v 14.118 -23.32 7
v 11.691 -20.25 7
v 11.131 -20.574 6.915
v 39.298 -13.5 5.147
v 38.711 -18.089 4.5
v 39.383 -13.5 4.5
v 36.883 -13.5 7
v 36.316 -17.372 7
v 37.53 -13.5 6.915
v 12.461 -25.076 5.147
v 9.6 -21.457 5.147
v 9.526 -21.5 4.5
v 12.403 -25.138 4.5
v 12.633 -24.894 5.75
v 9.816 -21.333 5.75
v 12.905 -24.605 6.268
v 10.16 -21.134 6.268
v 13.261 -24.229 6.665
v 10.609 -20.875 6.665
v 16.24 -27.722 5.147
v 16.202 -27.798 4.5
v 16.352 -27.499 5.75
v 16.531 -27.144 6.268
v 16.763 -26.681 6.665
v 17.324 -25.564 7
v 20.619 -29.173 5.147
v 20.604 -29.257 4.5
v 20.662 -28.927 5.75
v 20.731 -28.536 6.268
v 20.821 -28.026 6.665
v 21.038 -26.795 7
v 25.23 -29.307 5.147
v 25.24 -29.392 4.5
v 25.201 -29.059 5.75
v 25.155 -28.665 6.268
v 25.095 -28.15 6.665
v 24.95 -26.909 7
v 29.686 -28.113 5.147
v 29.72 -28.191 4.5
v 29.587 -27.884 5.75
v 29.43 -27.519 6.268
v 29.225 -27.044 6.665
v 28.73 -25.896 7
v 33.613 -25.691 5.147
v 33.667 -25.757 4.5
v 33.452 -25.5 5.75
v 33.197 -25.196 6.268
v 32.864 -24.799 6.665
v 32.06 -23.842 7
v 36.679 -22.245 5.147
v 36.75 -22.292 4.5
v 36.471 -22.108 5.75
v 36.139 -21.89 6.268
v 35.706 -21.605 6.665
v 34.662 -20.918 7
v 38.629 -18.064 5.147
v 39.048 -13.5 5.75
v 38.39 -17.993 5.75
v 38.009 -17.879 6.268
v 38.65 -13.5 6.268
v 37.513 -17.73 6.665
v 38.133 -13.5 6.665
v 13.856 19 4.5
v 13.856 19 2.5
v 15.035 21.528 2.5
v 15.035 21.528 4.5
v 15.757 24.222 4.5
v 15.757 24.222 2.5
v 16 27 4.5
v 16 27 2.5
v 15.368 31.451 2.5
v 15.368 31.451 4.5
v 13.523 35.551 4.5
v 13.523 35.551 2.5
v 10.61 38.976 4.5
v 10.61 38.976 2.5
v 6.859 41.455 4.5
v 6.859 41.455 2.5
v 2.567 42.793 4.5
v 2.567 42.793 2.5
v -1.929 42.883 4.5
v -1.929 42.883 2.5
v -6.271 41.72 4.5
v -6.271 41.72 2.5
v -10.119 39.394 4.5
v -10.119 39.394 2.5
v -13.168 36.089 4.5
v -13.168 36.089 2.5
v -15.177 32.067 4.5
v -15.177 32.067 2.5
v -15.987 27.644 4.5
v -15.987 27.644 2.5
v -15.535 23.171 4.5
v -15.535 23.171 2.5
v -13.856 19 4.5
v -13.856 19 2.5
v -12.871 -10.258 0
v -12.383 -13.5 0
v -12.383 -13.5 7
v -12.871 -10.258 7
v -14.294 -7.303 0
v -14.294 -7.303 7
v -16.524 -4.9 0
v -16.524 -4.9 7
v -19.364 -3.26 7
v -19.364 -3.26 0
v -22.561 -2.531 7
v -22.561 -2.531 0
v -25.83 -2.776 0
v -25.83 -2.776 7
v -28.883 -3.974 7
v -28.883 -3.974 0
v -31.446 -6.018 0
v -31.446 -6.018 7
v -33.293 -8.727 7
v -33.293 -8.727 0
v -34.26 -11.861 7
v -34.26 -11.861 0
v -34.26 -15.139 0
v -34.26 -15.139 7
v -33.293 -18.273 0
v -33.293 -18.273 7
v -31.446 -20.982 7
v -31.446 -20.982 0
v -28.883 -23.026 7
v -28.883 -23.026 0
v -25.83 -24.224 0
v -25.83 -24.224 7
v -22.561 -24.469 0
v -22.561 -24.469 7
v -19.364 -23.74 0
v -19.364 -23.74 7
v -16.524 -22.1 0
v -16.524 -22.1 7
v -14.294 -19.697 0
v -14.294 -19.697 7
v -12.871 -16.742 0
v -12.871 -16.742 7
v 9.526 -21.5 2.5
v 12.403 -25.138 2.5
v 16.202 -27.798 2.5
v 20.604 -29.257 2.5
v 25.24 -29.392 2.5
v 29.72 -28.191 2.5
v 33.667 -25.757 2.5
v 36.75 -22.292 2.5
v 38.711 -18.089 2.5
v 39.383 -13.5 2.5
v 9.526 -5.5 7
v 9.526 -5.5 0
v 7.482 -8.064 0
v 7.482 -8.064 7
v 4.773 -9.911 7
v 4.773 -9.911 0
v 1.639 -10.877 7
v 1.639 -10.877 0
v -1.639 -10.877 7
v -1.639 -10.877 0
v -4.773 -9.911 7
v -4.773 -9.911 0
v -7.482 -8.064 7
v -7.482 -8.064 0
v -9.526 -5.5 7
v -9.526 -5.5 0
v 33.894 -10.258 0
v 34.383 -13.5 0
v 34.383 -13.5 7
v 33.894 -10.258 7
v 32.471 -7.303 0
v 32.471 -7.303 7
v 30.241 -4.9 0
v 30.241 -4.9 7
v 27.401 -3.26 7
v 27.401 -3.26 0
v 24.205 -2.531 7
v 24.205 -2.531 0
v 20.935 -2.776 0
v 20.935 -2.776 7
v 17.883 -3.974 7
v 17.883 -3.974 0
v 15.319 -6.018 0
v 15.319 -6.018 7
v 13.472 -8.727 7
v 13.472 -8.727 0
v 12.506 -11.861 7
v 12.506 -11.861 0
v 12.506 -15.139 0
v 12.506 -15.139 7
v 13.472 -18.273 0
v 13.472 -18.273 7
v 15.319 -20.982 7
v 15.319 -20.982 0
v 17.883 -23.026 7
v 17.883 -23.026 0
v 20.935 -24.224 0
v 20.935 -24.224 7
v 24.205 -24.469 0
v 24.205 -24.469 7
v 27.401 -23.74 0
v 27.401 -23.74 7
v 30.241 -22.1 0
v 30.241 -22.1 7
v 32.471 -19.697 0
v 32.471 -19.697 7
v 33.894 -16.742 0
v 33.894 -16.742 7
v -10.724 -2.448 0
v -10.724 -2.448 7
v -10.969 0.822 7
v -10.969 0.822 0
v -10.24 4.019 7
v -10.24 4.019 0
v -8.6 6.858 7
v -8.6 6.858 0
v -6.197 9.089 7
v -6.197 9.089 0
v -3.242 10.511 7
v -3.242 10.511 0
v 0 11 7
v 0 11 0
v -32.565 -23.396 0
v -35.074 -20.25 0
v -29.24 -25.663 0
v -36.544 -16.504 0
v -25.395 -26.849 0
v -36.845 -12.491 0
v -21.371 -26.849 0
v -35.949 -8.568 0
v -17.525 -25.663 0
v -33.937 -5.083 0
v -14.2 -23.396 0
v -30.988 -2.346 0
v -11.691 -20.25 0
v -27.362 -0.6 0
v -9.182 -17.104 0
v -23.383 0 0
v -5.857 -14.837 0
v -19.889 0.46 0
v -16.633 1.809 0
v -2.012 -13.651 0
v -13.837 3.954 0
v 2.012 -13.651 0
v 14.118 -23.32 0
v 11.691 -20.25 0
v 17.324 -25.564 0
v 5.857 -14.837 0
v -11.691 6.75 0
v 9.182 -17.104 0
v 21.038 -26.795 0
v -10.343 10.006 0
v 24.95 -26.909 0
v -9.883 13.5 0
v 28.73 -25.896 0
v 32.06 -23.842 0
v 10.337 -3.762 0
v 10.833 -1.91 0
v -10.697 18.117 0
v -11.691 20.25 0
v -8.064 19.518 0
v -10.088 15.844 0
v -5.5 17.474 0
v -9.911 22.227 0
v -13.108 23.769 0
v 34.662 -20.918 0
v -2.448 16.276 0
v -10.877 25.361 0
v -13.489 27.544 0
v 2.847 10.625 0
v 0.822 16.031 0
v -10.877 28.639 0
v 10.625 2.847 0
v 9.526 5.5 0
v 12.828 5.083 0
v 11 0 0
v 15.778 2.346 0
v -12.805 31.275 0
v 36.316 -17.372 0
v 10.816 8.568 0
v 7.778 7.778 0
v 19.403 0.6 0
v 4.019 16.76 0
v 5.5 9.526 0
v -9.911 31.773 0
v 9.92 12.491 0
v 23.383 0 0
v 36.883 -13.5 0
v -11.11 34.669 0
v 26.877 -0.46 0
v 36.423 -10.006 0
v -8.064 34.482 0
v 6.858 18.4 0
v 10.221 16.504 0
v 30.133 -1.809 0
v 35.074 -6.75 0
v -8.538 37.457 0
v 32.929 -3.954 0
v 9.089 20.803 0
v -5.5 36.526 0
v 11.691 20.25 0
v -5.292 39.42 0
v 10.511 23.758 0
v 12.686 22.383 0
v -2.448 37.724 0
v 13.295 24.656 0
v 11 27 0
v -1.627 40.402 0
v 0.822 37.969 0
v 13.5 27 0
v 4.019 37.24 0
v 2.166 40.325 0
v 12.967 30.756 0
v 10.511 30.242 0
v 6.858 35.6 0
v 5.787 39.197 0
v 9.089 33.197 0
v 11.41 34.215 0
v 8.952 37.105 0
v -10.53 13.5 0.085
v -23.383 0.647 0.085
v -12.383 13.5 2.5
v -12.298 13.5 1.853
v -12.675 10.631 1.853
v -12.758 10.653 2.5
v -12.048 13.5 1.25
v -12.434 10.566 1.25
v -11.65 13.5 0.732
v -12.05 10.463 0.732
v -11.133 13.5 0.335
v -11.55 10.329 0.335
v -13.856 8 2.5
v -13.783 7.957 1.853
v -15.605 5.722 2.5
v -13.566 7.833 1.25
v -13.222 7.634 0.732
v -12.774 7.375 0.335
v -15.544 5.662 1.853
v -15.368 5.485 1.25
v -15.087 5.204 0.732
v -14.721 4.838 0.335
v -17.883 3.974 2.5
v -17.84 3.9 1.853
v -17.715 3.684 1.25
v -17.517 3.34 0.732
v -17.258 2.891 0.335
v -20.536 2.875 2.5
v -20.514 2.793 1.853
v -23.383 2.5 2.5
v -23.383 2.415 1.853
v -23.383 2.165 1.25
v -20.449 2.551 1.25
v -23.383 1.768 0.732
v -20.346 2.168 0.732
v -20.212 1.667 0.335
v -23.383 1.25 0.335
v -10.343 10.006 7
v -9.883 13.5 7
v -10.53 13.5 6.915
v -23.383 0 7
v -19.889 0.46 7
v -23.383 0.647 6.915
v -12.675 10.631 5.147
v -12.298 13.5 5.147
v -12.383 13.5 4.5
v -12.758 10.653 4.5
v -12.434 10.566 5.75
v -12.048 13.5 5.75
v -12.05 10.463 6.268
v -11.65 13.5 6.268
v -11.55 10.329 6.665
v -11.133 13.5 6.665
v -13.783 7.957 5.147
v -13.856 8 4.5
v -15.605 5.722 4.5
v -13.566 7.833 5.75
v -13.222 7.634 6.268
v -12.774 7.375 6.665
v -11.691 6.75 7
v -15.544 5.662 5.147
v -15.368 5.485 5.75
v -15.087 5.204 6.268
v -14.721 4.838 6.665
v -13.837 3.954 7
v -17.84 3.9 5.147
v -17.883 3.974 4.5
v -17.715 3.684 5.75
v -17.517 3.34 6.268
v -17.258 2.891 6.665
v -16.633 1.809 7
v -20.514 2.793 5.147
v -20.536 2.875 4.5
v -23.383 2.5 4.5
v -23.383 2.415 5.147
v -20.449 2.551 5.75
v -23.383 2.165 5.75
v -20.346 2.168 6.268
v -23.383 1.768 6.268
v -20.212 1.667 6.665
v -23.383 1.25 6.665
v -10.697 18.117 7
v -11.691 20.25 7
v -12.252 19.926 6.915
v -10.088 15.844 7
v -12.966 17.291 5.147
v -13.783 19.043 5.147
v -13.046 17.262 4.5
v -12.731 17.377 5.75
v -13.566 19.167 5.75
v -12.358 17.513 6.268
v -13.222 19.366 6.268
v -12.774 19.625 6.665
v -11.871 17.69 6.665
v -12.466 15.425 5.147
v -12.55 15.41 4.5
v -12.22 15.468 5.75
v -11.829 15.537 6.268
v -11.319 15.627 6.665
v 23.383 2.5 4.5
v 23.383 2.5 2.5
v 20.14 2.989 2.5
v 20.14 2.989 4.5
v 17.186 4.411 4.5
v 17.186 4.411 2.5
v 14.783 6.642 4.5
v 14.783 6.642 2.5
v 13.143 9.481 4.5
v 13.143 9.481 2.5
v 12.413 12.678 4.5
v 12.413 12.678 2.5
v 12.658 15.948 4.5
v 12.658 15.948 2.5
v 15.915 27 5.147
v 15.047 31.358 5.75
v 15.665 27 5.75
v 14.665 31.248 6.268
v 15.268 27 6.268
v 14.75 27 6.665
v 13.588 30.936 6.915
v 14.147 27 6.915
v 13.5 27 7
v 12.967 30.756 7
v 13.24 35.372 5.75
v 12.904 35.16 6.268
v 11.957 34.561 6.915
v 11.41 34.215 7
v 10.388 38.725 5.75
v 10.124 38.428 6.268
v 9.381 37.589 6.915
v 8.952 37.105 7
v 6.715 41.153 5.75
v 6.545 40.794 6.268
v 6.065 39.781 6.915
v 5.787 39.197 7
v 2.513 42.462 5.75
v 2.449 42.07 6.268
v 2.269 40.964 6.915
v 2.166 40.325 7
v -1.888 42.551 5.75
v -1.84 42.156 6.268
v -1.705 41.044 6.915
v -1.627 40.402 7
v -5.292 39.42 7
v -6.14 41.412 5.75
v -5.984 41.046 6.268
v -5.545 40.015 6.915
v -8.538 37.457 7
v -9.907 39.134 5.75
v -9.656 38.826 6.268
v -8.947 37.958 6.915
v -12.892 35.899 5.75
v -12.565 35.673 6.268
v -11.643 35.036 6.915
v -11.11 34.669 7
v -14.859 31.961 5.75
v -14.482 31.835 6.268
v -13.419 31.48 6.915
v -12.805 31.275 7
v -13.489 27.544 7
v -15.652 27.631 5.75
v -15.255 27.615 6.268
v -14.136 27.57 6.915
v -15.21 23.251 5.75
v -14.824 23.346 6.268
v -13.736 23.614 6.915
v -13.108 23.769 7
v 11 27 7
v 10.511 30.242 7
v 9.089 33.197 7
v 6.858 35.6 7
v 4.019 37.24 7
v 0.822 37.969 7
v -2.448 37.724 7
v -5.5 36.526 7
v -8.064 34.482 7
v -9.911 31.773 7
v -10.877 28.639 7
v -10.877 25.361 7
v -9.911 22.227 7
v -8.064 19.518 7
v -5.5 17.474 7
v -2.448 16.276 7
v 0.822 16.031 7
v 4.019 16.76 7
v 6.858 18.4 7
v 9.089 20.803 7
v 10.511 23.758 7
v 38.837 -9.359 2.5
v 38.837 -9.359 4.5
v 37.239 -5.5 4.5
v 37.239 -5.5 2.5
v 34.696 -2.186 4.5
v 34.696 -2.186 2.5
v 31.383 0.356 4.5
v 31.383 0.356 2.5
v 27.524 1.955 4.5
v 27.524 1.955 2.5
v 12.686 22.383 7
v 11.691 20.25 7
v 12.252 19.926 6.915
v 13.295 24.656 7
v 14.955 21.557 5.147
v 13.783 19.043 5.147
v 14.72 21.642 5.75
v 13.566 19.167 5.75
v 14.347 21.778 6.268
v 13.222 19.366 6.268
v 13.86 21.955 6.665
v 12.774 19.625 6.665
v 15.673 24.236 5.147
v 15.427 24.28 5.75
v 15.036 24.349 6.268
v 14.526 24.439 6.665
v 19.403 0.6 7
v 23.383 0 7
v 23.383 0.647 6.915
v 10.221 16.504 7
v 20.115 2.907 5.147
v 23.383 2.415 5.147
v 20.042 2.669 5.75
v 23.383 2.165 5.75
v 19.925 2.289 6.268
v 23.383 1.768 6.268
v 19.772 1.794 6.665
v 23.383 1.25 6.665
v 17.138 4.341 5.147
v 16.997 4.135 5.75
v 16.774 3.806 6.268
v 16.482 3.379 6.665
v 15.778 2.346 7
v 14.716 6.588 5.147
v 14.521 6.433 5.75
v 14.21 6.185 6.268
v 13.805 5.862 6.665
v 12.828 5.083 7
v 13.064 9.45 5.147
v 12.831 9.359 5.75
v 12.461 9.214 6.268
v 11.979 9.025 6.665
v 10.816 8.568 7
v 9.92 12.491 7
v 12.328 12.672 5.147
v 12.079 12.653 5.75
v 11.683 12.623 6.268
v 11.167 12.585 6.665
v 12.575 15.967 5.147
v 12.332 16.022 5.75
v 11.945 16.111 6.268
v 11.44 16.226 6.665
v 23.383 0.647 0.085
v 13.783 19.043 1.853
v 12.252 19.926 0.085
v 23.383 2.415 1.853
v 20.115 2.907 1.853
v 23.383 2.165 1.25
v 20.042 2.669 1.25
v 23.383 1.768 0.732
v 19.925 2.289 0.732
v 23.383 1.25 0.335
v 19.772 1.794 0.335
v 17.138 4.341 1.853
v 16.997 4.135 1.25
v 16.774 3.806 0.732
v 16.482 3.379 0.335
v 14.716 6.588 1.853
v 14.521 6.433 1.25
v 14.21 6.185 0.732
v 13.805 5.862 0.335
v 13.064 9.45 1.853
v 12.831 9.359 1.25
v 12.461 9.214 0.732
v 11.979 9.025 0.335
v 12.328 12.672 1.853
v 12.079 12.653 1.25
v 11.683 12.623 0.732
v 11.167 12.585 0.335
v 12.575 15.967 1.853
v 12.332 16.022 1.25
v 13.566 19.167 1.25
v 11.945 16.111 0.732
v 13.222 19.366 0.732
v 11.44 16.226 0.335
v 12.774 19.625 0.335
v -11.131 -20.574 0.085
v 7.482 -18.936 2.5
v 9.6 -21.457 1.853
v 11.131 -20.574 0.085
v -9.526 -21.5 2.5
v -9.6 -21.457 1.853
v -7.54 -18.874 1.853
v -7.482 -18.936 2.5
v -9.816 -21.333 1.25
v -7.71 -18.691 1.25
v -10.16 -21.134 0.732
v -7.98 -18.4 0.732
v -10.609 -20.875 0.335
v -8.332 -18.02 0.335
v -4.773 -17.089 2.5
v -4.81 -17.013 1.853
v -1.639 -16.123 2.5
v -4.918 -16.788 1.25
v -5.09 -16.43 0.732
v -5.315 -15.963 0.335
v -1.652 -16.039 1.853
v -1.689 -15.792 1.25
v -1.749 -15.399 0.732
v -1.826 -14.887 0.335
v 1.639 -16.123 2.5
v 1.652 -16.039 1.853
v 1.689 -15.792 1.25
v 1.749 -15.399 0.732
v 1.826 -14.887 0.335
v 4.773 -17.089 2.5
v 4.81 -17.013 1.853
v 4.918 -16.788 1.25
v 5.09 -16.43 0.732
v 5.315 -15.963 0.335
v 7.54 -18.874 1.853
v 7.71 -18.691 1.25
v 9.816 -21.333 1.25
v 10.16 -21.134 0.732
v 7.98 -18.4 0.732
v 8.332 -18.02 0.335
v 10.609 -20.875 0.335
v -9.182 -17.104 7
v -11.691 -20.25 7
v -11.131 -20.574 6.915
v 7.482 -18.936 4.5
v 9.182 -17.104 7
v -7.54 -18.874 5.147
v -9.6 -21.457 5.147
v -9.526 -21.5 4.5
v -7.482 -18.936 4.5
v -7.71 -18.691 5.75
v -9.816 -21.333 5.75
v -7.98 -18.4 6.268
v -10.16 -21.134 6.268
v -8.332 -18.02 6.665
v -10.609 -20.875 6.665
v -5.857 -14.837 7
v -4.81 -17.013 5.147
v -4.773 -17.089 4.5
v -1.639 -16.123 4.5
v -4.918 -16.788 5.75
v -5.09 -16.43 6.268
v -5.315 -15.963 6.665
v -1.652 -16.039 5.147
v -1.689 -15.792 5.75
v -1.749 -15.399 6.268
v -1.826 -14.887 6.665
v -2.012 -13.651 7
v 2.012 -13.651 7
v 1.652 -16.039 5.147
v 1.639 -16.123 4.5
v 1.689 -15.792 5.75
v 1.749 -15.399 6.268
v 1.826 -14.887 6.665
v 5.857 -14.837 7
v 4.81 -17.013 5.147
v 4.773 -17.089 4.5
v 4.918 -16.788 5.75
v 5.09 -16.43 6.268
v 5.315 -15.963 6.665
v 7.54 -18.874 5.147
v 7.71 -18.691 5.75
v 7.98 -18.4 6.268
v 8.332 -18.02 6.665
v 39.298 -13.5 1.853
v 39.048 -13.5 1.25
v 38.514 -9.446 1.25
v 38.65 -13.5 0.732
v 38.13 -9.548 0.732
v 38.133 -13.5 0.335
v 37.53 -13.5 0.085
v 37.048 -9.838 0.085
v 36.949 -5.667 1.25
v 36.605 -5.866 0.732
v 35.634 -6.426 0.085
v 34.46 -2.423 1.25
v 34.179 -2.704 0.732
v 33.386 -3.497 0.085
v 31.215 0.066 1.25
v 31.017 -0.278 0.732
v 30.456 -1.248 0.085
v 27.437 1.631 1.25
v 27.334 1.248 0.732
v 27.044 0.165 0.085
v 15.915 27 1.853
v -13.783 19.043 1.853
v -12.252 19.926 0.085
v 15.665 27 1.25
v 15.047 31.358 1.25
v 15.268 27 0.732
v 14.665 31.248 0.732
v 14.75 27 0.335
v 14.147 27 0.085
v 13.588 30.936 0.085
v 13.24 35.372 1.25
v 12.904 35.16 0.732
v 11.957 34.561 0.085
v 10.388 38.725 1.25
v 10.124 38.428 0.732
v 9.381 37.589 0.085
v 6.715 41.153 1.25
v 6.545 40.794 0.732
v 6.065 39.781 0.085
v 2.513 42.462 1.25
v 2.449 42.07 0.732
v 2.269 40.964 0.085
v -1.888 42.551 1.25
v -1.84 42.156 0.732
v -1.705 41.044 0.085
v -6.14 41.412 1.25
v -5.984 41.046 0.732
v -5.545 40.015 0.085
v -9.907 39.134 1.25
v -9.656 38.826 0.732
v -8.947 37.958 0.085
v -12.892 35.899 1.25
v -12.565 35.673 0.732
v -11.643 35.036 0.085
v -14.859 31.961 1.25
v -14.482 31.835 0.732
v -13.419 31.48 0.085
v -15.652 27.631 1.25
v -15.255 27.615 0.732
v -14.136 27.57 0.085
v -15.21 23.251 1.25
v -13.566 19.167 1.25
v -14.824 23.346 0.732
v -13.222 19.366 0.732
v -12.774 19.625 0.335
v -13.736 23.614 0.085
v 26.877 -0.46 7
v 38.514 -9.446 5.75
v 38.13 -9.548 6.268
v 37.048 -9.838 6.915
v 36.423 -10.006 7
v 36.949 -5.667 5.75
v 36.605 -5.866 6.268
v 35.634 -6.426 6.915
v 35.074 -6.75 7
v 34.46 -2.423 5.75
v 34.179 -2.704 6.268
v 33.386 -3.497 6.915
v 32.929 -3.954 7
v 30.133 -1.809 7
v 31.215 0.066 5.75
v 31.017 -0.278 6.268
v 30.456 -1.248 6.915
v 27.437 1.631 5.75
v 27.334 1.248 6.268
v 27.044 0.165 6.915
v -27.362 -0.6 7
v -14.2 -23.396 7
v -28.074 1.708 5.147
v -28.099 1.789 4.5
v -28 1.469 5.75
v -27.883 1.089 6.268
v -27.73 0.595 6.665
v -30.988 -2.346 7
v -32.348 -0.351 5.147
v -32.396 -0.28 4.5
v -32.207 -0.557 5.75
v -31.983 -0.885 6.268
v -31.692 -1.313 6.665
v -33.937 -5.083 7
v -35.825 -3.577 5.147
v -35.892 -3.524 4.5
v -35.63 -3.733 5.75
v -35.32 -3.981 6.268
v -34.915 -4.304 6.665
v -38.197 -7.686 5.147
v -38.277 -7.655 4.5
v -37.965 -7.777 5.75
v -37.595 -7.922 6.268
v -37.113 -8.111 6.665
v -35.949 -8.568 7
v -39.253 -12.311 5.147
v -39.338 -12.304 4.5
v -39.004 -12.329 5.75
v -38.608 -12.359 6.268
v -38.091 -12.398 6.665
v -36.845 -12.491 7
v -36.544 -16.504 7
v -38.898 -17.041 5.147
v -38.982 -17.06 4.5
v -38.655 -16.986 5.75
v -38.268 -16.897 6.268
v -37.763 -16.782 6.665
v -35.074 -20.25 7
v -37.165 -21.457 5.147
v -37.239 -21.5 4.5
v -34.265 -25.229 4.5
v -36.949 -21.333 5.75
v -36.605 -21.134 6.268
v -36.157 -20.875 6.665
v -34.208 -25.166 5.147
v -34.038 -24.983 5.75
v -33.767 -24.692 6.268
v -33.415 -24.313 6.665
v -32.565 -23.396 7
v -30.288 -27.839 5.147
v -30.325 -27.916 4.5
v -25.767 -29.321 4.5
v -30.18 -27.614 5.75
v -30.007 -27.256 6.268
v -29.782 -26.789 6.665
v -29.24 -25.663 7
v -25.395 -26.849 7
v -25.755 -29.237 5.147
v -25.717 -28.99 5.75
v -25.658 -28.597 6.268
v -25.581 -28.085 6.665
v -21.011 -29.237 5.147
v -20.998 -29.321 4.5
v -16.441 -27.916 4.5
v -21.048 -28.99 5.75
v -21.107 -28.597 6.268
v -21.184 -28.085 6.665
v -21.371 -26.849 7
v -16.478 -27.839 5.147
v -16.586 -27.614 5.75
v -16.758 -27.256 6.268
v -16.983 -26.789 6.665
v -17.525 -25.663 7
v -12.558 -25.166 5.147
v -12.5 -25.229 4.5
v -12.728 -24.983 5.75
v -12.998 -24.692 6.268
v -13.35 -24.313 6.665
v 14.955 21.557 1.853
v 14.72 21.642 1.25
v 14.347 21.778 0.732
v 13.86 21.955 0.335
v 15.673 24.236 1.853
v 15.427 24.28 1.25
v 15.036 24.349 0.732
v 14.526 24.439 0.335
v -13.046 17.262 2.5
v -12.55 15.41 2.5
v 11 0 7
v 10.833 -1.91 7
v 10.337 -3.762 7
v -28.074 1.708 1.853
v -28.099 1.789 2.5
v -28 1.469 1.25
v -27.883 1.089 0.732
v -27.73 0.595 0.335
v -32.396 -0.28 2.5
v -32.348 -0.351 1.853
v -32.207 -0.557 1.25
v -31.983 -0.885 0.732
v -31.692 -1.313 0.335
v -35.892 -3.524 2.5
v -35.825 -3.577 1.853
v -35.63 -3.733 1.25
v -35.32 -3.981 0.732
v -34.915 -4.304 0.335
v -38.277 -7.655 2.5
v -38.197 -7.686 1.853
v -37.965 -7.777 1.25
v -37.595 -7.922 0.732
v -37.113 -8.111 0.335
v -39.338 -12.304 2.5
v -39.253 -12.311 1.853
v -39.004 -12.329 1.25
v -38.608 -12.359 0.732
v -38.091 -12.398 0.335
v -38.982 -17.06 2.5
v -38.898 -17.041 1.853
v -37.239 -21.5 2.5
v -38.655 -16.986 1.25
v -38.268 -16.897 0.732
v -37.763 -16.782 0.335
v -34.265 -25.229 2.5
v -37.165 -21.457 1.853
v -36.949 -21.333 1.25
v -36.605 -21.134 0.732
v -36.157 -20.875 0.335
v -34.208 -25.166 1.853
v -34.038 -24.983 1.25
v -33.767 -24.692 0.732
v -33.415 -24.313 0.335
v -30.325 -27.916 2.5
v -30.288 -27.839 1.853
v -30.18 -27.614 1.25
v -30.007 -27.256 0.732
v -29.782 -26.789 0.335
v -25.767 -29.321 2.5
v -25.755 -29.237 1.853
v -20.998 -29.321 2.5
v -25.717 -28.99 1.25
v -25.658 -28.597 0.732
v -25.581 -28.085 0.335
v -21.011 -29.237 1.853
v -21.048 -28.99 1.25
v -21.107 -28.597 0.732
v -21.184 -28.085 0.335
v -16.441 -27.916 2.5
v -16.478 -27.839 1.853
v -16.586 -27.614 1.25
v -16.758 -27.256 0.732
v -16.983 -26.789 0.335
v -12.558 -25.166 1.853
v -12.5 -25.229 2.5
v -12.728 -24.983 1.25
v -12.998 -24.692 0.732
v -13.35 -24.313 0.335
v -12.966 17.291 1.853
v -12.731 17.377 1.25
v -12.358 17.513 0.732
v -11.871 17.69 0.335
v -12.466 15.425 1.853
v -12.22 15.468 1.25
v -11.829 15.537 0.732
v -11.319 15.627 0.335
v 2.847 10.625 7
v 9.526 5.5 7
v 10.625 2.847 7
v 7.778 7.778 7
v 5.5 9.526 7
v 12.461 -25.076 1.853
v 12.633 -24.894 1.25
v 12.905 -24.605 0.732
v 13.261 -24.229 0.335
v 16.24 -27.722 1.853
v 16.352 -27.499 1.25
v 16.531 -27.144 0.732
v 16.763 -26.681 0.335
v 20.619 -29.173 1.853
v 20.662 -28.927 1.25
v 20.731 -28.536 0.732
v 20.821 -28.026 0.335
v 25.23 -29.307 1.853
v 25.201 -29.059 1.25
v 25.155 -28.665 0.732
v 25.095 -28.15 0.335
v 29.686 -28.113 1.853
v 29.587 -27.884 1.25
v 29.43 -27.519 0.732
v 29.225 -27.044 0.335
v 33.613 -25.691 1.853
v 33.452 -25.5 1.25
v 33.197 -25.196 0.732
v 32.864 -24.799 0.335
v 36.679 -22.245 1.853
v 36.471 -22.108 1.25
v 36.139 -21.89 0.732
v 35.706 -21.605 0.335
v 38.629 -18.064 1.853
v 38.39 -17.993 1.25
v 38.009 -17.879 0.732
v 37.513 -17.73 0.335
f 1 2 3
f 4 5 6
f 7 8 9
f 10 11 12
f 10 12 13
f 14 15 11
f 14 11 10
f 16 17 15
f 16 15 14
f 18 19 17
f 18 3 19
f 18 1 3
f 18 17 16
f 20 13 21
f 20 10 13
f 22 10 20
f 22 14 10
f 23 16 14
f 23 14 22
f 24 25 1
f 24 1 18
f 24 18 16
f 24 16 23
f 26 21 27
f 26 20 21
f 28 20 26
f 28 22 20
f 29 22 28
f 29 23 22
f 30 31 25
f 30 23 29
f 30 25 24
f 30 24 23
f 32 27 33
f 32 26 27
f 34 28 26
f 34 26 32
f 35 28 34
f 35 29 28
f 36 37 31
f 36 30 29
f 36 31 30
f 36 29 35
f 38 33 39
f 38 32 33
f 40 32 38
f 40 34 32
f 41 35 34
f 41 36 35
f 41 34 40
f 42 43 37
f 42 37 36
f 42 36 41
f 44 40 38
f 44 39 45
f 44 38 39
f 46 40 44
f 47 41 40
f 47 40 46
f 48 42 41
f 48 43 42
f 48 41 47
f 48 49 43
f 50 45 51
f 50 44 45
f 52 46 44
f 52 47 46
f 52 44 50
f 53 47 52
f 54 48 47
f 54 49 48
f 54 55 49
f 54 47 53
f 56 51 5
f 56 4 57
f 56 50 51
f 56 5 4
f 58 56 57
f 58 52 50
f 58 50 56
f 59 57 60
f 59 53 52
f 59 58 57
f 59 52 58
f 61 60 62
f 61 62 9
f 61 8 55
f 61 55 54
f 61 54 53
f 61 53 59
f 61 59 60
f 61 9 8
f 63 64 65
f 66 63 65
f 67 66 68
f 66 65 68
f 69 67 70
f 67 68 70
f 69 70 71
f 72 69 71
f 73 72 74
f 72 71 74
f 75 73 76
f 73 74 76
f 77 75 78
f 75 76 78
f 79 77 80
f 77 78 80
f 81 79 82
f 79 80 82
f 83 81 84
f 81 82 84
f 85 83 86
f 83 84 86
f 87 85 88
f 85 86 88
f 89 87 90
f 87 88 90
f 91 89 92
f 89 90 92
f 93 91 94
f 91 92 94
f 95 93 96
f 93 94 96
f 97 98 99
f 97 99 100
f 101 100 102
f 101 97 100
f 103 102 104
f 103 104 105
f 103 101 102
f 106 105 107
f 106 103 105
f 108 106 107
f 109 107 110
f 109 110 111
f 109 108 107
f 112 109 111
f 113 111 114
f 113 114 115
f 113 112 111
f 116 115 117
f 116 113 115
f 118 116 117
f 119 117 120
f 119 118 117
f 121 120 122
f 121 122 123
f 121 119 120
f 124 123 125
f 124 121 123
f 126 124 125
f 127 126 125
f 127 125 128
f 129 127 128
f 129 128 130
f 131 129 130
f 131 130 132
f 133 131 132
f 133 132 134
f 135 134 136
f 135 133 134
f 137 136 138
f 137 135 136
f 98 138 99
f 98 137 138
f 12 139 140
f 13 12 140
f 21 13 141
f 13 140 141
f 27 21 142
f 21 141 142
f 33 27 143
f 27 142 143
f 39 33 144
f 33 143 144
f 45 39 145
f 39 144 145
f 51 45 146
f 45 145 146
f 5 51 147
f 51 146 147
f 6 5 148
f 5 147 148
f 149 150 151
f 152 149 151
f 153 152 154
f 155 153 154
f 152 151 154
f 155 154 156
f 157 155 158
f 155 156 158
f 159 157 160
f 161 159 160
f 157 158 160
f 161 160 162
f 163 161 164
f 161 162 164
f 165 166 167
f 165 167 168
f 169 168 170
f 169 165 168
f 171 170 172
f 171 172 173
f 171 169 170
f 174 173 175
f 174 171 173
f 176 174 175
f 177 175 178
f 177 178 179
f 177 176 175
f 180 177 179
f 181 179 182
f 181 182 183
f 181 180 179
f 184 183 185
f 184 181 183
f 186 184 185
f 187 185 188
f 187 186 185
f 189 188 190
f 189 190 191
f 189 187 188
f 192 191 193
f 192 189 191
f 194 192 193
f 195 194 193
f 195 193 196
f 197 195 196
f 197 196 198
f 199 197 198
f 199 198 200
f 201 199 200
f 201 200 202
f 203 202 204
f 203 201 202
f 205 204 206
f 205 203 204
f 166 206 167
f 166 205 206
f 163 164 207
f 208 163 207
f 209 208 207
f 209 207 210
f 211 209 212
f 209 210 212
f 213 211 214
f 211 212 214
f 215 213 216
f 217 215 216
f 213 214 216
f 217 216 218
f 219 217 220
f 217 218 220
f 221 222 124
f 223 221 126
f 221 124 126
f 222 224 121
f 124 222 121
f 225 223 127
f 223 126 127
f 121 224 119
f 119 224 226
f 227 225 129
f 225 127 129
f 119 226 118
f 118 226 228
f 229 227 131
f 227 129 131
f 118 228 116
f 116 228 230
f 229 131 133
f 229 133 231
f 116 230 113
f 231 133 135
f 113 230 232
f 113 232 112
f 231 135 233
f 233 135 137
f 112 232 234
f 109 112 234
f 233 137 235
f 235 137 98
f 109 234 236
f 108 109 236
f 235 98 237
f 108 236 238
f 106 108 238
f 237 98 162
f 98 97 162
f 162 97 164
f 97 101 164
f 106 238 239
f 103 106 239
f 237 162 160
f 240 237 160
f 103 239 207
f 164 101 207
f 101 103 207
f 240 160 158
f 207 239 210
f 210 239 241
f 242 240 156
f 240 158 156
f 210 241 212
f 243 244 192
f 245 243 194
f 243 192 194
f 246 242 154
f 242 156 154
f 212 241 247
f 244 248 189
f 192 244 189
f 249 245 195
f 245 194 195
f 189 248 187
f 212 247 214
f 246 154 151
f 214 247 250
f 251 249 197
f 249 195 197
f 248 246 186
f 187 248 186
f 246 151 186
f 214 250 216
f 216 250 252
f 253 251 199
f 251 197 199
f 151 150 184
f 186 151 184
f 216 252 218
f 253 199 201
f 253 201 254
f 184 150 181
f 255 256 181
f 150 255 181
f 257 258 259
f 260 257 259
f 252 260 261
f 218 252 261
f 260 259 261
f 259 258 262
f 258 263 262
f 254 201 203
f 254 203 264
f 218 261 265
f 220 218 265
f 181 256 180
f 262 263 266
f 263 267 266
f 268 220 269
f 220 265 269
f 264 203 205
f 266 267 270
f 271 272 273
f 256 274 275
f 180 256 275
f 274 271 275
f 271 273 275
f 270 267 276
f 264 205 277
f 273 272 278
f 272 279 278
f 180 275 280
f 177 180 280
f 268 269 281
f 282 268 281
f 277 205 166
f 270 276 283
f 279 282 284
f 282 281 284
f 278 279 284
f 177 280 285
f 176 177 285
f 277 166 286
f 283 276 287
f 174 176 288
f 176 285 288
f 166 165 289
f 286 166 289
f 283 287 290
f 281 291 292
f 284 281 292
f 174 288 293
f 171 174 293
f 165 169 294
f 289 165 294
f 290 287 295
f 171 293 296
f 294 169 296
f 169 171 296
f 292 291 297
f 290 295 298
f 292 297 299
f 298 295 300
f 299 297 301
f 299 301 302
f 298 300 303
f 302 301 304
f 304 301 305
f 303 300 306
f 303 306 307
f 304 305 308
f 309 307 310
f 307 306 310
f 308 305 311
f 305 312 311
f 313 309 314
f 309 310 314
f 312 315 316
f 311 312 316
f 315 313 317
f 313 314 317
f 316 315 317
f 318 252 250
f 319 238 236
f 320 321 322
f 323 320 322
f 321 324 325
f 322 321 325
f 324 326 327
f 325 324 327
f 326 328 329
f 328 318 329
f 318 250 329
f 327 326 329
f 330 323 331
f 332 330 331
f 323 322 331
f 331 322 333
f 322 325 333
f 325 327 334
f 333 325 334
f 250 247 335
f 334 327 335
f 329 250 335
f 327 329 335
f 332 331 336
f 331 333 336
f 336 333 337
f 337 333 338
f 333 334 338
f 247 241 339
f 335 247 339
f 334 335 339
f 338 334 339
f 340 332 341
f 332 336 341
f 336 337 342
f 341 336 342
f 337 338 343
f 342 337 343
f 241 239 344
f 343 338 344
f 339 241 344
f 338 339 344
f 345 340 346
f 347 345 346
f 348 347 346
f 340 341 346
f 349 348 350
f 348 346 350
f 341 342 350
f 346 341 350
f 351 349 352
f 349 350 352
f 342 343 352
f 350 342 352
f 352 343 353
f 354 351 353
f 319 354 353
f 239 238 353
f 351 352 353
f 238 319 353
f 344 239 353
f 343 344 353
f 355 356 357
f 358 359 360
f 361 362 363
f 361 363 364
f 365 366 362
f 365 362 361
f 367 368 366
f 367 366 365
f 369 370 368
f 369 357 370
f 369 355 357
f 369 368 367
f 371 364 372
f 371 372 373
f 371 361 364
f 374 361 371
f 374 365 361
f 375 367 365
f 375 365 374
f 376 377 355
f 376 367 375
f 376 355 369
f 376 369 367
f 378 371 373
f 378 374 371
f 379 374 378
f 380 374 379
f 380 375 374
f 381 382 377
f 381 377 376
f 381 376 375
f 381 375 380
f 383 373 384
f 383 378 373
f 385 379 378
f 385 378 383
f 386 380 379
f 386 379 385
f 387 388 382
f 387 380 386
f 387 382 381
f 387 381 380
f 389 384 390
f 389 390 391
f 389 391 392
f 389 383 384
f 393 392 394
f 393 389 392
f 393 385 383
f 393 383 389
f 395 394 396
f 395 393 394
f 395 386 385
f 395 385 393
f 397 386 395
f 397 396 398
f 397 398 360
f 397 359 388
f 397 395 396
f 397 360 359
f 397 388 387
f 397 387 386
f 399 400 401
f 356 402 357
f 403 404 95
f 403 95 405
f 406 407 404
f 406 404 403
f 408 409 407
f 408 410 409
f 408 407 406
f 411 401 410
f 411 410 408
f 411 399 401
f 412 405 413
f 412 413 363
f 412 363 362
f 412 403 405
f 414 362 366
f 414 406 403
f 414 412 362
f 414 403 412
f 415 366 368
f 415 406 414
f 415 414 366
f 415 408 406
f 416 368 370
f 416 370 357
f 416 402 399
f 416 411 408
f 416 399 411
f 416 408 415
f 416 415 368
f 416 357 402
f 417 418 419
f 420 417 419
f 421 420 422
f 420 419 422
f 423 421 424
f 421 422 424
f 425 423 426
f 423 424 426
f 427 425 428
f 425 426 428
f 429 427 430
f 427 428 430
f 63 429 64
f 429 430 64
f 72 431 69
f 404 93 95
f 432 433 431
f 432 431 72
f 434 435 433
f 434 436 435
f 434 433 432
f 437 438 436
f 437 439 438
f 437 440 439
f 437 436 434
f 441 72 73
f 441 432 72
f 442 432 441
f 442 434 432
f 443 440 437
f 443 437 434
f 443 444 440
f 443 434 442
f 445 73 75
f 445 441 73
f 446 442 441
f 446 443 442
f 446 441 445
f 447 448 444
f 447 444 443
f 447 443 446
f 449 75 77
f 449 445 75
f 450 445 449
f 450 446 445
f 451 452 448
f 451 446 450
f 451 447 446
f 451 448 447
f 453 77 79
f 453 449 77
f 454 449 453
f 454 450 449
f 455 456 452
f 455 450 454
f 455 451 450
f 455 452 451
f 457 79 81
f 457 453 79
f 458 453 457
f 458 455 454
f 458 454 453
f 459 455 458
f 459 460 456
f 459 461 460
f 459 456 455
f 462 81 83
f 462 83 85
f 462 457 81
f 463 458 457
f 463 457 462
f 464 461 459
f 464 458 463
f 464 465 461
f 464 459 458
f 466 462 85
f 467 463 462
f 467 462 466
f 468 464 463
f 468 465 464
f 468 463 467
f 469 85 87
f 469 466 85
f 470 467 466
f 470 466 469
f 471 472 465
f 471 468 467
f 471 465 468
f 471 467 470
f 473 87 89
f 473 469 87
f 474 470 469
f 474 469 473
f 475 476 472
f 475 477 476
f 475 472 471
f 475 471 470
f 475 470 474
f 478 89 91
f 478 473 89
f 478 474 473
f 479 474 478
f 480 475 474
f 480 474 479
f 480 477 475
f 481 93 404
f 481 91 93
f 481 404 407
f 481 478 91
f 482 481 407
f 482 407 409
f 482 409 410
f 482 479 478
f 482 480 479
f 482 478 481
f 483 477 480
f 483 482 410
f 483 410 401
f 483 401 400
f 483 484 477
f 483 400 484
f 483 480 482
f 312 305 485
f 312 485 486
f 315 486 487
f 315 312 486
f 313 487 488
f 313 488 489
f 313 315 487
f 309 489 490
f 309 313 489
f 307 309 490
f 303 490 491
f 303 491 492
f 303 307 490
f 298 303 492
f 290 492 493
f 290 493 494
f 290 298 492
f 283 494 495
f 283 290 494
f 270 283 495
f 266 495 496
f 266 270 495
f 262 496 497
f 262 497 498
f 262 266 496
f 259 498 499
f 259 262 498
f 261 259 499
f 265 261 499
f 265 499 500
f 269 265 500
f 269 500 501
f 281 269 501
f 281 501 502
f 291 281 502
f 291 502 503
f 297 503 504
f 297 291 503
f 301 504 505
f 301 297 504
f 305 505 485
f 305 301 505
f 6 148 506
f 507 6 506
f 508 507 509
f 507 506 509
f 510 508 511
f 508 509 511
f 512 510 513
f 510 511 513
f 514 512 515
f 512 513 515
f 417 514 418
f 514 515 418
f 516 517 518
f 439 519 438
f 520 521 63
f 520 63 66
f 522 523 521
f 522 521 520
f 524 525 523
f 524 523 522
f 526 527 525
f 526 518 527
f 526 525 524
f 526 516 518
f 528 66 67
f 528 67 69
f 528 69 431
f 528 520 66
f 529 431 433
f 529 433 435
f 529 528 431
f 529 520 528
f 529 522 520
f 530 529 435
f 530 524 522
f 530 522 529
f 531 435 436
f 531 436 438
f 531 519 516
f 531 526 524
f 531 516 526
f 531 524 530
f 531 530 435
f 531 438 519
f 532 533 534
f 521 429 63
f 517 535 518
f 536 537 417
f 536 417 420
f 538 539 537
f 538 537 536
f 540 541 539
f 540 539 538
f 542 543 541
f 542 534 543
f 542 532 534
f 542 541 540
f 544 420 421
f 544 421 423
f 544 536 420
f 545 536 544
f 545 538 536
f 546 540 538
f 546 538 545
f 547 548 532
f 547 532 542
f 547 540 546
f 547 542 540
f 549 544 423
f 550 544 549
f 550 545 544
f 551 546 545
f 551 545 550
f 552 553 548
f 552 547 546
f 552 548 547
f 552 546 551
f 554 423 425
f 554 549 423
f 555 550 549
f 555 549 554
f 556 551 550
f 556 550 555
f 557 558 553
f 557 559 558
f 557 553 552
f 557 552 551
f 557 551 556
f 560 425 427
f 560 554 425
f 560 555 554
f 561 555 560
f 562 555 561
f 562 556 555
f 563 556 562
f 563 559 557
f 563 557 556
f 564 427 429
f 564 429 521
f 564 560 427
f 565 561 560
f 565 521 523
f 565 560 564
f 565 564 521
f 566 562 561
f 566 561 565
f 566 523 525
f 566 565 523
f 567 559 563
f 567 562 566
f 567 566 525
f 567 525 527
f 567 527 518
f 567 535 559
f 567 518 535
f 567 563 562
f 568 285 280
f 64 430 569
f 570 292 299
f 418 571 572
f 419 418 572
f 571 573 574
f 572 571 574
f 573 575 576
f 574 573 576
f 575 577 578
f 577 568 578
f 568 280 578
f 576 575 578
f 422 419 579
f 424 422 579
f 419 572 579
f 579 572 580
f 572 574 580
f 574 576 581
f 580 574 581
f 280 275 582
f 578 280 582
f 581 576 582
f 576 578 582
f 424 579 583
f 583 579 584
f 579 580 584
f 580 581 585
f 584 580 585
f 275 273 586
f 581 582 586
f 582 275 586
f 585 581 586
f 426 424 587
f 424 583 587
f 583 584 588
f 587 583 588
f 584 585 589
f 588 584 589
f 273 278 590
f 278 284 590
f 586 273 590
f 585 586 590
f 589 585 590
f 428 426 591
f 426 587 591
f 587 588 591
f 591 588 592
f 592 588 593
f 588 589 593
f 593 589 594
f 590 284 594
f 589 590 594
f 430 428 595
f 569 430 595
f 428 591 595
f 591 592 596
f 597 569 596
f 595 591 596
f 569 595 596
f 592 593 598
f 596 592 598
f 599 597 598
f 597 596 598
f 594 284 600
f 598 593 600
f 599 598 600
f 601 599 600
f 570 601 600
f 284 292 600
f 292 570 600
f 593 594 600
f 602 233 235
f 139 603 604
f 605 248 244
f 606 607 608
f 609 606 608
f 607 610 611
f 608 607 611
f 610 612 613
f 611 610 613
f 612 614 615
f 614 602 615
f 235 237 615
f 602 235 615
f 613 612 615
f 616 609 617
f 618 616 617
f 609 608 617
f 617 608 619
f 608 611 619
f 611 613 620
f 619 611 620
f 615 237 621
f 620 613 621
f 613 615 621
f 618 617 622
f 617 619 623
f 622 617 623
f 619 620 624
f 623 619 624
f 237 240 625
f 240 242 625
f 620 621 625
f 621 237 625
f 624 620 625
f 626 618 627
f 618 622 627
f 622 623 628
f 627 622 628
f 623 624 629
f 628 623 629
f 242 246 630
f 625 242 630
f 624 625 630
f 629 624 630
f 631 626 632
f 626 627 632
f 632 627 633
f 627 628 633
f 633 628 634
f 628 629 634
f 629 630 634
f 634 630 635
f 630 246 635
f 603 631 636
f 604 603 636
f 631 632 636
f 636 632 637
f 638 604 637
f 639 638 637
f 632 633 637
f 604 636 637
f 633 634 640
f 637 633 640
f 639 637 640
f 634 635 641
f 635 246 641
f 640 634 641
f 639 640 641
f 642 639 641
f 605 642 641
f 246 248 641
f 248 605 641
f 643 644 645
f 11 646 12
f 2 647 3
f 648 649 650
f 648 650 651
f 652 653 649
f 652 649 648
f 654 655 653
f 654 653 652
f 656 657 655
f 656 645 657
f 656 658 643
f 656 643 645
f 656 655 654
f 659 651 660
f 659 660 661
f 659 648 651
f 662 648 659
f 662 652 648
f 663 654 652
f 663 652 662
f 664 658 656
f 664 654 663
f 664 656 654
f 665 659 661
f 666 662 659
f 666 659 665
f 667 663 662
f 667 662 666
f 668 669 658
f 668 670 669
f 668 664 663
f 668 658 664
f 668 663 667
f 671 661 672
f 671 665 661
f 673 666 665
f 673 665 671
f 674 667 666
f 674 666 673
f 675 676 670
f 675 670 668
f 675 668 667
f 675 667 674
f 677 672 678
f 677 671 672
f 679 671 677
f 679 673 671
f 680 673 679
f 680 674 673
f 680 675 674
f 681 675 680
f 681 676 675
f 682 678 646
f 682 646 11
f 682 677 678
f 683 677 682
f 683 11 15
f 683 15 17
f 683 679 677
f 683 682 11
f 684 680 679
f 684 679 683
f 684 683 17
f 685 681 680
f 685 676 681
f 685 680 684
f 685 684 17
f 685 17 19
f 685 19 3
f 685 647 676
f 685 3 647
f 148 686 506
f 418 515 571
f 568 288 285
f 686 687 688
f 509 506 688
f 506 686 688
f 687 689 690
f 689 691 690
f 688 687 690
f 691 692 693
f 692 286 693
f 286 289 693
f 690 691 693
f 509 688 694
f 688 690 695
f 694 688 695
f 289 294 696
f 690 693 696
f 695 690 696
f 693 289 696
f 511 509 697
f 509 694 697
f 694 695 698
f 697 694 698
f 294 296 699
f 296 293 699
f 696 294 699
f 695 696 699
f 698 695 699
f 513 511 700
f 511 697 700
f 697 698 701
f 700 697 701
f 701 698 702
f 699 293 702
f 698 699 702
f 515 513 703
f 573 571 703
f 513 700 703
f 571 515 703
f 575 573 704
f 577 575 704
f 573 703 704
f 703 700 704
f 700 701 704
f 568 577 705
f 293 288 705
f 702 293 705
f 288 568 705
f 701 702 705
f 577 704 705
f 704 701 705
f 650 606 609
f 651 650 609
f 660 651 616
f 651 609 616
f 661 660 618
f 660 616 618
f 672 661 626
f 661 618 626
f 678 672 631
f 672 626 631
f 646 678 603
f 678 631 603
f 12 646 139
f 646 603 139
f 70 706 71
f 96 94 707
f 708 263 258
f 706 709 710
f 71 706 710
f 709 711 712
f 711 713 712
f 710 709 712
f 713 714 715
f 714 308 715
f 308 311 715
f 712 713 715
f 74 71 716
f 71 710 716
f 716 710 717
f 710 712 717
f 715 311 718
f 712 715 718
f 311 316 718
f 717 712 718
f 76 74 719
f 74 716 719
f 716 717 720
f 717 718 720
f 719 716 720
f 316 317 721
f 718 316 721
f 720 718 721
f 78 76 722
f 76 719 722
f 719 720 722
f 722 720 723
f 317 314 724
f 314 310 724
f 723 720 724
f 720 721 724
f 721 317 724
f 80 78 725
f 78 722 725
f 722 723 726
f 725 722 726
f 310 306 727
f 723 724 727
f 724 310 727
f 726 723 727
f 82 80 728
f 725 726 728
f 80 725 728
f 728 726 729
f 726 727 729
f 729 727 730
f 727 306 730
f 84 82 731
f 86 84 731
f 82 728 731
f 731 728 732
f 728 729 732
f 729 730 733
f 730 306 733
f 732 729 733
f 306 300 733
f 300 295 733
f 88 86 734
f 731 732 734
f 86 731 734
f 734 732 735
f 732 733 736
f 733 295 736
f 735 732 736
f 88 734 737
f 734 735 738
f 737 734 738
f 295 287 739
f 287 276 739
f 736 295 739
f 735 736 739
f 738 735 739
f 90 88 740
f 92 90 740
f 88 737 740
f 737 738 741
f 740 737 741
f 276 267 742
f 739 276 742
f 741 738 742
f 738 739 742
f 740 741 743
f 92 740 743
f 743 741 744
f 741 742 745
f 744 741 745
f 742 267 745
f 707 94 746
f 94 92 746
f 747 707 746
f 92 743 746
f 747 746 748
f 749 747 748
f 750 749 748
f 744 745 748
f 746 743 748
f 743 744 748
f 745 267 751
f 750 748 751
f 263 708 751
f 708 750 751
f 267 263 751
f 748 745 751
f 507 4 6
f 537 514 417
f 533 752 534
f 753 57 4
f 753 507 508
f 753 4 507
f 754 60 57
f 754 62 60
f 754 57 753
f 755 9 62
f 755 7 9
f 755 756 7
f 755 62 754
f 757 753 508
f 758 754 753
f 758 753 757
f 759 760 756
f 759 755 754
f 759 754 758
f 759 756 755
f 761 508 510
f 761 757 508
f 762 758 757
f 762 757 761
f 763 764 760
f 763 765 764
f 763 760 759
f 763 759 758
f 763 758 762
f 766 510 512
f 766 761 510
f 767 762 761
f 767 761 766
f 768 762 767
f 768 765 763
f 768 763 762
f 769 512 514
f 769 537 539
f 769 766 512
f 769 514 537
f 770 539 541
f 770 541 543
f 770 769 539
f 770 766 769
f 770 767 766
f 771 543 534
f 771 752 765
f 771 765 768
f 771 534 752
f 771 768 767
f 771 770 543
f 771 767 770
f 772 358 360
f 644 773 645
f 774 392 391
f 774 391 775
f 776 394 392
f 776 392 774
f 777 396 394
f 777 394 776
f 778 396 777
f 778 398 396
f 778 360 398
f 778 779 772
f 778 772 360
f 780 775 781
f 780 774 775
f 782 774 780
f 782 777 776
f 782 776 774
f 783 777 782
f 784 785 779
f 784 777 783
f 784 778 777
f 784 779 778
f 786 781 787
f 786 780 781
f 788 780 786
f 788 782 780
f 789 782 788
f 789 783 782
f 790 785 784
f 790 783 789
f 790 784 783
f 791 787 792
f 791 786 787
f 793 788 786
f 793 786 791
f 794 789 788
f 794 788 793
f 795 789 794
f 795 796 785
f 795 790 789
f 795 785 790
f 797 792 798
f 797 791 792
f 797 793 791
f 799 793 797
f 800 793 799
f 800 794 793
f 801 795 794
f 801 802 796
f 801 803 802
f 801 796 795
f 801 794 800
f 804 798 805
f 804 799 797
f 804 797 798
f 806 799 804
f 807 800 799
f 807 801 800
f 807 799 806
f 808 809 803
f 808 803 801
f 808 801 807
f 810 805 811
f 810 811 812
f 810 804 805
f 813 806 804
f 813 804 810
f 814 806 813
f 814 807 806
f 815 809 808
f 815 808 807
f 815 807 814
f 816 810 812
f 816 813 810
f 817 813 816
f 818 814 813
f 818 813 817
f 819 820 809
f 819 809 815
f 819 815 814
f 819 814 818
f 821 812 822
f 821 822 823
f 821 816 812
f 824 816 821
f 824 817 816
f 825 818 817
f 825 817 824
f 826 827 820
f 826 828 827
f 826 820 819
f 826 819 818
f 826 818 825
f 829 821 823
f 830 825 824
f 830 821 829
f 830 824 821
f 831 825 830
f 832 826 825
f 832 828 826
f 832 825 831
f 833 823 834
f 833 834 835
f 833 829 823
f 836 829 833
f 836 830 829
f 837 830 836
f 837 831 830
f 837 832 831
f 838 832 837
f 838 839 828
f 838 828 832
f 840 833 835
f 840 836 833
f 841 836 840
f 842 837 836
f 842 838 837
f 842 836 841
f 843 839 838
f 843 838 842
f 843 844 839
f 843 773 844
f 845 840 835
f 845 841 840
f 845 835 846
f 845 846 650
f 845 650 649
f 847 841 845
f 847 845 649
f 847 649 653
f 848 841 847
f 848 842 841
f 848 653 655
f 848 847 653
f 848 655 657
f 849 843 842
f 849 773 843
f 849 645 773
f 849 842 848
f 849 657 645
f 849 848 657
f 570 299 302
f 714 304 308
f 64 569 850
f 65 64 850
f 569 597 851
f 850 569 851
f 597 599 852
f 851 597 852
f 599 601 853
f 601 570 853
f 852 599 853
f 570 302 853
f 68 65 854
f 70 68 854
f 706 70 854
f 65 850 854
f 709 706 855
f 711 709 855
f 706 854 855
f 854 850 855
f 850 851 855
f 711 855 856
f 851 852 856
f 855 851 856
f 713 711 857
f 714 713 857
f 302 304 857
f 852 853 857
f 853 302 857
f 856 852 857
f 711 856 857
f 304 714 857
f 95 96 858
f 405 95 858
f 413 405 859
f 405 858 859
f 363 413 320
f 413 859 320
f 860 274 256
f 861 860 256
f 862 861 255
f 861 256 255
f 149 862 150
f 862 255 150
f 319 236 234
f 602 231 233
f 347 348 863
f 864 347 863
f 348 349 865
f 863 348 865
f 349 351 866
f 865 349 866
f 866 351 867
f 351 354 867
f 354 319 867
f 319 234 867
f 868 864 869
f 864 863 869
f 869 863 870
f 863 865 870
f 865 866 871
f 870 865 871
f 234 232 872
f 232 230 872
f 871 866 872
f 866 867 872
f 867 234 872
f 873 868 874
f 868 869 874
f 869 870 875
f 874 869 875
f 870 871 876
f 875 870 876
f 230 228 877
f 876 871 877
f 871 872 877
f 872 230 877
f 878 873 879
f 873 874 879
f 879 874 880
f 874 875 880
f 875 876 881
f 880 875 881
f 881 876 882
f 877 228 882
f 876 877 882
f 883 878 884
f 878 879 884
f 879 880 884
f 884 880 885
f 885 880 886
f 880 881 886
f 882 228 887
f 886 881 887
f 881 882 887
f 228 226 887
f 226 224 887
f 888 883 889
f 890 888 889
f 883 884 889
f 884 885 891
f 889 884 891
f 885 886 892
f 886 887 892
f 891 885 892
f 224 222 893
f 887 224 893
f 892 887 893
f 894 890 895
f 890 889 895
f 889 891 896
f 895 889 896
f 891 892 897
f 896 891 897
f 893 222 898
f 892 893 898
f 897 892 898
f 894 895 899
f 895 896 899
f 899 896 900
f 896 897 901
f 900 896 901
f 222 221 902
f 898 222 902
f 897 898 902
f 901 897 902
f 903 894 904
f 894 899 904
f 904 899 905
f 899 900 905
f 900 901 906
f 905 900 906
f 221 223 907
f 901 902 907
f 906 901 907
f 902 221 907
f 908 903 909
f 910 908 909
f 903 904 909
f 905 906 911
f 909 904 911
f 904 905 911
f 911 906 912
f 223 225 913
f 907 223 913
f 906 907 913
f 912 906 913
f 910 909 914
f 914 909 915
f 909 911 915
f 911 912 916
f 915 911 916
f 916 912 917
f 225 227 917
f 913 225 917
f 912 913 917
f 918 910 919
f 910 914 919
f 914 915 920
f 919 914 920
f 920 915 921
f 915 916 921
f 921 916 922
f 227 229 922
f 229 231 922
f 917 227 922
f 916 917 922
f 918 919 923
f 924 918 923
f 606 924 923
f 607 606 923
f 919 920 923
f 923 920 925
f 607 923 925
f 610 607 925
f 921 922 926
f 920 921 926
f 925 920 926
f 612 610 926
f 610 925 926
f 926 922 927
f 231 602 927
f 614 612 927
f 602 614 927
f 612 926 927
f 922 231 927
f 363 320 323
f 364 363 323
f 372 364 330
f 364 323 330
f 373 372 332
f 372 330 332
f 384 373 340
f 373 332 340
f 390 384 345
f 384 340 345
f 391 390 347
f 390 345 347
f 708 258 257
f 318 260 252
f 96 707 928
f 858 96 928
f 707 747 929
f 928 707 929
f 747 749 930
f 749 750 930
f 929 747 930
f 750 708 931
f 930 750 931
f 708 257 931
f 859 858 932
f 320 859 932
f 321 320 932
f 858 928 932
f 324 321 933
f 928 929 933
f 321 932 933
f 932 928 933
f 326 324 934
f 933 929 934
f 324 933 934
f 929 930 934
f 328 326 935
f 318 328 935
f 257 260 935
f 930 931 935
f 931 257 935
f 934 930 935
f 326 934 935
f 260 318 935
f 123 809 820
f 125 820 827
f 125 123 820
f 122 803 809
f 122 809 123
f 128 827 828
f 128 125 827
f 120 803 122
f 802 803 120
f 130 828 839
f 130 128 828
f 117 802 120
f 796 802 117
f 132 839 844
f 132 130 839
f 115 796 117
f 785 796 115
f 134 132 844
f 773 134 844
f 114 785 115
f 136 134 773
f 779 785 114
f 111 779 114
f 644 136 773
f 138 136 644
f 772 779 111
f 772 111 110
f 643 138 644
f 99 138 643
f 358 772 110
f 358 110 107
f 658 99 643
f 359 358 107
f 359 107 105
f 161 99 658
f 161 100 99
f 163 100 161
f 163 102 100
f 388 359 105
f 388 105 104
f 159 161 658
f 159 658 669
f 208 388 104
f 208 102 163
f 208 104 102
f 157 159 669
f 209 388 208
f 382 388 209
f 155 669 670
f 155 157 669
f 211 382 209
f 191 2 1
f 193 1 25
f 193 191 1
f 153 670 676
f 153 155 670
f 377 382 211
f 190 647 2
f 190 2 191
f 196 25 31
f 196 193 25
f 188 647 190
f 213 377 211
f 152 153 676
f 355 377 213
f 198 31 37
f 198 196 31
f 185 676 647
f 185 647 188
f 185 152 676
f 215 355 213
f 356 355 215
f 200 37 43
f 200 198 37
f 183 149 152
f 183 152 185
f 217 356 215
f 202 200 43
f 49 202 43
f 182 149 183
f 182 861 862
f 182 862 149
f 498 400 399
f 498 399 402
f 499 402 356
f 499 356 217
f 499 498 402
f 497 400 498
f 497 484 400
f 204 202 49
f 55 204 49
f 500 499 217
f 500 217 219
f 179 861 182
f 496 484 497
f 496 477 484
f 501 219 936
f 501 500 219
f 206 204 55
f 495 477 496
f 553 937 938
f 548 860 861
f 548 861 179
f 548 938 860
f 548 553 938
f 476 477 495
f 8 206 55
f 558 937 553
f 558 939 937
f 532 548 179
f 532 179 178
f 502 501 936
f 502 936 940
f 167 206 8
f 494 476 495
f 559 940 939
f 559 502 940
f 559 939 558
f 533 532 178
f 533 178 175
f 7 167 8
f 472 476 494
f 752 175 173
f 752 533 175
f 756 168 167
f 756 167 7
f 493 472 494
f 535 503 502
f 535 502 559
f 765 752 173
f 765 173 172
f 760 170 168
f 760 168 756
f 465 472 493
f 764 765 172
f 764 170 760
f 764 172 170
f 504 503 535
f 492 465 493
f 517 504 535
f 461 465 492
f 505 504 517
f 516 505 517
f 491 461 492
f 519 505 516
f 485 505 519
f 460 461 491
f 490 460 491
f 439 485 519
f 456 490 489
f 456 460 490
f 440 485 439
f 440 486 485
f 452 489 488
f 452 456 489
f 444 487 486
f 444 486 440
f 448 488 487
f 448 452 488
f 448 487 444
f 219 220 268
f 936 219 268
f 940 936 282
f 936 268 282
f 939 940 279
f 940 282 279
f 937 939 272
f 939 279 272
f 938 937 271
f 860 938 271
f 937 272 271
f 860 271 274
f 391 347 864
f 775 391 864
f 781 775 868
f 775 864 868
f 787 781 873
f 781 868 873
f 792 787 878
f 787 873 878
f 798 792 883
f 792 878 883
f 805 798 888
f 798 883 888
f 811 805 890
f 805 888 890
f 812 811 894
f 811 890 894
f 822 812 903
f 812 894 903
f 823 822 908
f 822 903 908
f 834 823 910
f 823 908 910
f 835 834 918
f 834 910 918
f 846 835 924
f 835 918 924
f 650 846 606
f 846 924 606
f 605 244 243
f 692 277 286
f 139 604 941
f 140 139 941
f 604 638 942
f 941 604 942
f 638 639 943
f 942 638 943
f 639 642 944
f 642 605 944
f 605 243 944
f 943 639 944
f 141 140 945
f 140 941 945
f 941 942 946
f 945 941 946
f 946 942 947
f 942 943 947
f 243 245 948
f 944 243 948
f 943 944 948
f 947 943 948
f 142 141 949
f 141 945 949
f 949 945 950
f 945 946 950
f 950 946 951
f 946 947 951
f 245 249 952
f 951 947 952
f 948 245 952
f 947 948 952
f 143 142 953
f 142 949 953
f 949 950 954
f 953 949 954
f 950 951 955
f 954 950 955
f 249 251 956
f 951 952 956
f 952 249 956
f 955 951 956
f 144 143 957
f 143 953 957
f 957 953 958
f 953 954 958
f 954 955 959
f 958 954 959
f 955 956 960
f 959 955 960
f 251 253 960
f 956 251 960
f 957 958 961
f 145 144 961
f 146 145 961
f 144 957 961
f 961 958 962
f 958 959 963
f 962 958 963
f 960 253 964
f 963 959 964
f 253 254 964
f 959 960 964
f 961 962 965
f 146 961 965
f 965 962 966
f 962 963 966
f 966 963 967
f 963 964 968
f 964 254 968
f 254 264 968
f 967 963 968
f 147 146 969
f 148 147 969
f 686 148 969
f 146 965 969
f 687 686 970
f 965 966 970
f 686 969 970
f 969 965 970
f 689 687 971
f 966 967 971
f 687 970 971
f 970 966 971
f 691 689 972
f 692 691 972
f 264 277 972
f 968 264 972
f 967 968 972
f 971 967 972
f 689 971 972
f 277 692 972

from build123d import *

# Parameters (mm, degrees)
F0_R     = 11
F1_DEPTH = 7
F2_R     = 2.5


with BuildPart() as f1:
    # F0 (on Top) → F1 (new body)
    with BuildSketch(Plane.XY):
        with BuildLine():
            ThreePointArc((-13.8564063169, 18.9999997511), (-7.9999998612, 13.1435934593), (3.3e-08, 11))
            ThreePointArc((3.3e-08, 11), (8.0000000671, 13.1435935782), (13.8564065215, 19.0000001056))
            ThreePointArc((13.8564065215, 19.0000001056), (15.4548132364, 22.8588953372), (16, 27))
            ThreePointArc((16, 27), (-4.1411048604, 42.4548131834), (-13.8564063169, 18.9999997511))
        make_face()
        with Locations((0, 27)):
            Circle(F0_R, mode=Mode.SUBTRACT)
        with BuildLine():
            ThreePointArc((-9.5262794581, -5.4999999715), (-9.5262794251, 5.5000000286), (3.3e-08, 11))
            ThreePointArc((3.3e-08, 11), (-7.9999998612, 13.1435934593), (-13.8564063169, 18.9999997511))
            ThreePointArc((-13.8564063169, 18.9999997511), (-12.7575017758, 16.3470093573), (-12.3826859022, 13.5))
            ThreePointArc((-12.3826859022, 13.5), (-15.6045113091, 5.7218254069), (-23.3826859022, 2.5))
            ThreePointArc((-23.3826859022, 2.5), (-15.3826859164, 0.3564064688), (-9.5262794581, -5.4999999715))
        make_face()
        with BuildLine():
            ThreePointArc((9.5262794719, -21.5000000524), (7.3826859022, -13.5000000639), (9.5262794079, -5.5000000584))
            ThreePointArc((9.5262794079, -5.5000000584), (-5.02e-08, -11), (-9.5262794581, -5.4999999715))
            ThreePointArc((-9.5262794581, -5.4999999715), (-7.9278726858, -9.3588952624), (-7.3826859022, -13.5))
            ThreePointArc((-7.3826859022, -13.5), (-7.9278726602, -17.641104642), (-9.5262793592, -21.4999998571))
            ThreePointArc((-9.5262793592, -21.4999998571), (1.127e-07, -16), (9.5262794719, -21.5000000524))
        make_face()
        with BuildLine():
            ThreePointArc((3.3e-08, 11), (7.7781746047, 7.7781745814), (11, 0))
            ThreePointArc((11, 0), (10.6251840805, -2.8470095287), (9.5262794079, -5.5000000584))
            ThreePointArc((9.5262794079, -5.5000000584), (15.382685873, 0.3564064437), (23.3826859022, 2.5))
            ThreePointArc((23.3826859022, 2.5), (13.8564064301, 8.0000000528), (13.8564065215, 19.0000001056))
            ThreePointArc((13.8564065215, 19.0000001056), (8.0000000671, 13.1435935782), (3.3e-08, 11))
        make_face()
        with BuildLine():
            ThreePointArc((-7.3826859022, -13.5), (-7.9278726858, -9.3588952624), (-9.5262794581, -5.4999999715))
            ThreePointArc((-9.5262794581, -5.4999999715), (-15.3826859164, 0.3564064688), (-23.3826859022, 2.5))
            ThreePointArc((-23.3826859022, 2.5), (-37.2390923215, -21.5000000714), (-9.5262793592, -21.4999998571))
            ThreePointArc((-9.5262793592, -21.4999998571), (-7.9278726602, -17.641104642), (-7.3826859022, -13.5))
        make_face()
        with Locations((-23.3826859022, -13.5)):
            Circle(F0_R, mode=Mode.SUBTRACT)
        with BuildLine():
            ThreePointArc((23.3826859022, 2.5), (15.382685873, 0.3564064437), (9.5262794079, -5.5000000584))
            ThreePointArc((9.5262794079, -5.5000000584), (7.3826859022, -13.5000000639), (9.5262794719, -21.5000000524))
            ThreePointArc((9.5262794719, -21.5000000524), (27.523790653, -28.9548132128), (39.3826859022, -13.5))
            ThreePointArc((39.3826859022, -13.5), (34.6963944012, -2.186291501), (23.3826859022, 2.5))
        make_face()
        with Locations((23.3826859022, -13.5)):
            Circle(F0_R, mode=Mode.SUBTRACT)
    extrude(amount=F1_DEPTH)

    # F2
    f2_edges = [f1.edges().sort_by_distance(p)[0] for p in [
        (0, 43, 7),
        (0, 43, 0),
        (13.856406, 8, 7),
        (13.856406, 8, 0),
        (37.239092, -21.5, 0),
        (37.239092, -21.5, 7),
        (0, -16, 7),
        (0, -16, 0),
        (-37.239092, -21.5, 0),
        (-37.239092, -21.5, 7),
        (-13.856407, 8, 7),
        (-13.856407, 8, 0),
    ]]
    fillet(f2_edges, radius=F2_R)


solid = f1.part
